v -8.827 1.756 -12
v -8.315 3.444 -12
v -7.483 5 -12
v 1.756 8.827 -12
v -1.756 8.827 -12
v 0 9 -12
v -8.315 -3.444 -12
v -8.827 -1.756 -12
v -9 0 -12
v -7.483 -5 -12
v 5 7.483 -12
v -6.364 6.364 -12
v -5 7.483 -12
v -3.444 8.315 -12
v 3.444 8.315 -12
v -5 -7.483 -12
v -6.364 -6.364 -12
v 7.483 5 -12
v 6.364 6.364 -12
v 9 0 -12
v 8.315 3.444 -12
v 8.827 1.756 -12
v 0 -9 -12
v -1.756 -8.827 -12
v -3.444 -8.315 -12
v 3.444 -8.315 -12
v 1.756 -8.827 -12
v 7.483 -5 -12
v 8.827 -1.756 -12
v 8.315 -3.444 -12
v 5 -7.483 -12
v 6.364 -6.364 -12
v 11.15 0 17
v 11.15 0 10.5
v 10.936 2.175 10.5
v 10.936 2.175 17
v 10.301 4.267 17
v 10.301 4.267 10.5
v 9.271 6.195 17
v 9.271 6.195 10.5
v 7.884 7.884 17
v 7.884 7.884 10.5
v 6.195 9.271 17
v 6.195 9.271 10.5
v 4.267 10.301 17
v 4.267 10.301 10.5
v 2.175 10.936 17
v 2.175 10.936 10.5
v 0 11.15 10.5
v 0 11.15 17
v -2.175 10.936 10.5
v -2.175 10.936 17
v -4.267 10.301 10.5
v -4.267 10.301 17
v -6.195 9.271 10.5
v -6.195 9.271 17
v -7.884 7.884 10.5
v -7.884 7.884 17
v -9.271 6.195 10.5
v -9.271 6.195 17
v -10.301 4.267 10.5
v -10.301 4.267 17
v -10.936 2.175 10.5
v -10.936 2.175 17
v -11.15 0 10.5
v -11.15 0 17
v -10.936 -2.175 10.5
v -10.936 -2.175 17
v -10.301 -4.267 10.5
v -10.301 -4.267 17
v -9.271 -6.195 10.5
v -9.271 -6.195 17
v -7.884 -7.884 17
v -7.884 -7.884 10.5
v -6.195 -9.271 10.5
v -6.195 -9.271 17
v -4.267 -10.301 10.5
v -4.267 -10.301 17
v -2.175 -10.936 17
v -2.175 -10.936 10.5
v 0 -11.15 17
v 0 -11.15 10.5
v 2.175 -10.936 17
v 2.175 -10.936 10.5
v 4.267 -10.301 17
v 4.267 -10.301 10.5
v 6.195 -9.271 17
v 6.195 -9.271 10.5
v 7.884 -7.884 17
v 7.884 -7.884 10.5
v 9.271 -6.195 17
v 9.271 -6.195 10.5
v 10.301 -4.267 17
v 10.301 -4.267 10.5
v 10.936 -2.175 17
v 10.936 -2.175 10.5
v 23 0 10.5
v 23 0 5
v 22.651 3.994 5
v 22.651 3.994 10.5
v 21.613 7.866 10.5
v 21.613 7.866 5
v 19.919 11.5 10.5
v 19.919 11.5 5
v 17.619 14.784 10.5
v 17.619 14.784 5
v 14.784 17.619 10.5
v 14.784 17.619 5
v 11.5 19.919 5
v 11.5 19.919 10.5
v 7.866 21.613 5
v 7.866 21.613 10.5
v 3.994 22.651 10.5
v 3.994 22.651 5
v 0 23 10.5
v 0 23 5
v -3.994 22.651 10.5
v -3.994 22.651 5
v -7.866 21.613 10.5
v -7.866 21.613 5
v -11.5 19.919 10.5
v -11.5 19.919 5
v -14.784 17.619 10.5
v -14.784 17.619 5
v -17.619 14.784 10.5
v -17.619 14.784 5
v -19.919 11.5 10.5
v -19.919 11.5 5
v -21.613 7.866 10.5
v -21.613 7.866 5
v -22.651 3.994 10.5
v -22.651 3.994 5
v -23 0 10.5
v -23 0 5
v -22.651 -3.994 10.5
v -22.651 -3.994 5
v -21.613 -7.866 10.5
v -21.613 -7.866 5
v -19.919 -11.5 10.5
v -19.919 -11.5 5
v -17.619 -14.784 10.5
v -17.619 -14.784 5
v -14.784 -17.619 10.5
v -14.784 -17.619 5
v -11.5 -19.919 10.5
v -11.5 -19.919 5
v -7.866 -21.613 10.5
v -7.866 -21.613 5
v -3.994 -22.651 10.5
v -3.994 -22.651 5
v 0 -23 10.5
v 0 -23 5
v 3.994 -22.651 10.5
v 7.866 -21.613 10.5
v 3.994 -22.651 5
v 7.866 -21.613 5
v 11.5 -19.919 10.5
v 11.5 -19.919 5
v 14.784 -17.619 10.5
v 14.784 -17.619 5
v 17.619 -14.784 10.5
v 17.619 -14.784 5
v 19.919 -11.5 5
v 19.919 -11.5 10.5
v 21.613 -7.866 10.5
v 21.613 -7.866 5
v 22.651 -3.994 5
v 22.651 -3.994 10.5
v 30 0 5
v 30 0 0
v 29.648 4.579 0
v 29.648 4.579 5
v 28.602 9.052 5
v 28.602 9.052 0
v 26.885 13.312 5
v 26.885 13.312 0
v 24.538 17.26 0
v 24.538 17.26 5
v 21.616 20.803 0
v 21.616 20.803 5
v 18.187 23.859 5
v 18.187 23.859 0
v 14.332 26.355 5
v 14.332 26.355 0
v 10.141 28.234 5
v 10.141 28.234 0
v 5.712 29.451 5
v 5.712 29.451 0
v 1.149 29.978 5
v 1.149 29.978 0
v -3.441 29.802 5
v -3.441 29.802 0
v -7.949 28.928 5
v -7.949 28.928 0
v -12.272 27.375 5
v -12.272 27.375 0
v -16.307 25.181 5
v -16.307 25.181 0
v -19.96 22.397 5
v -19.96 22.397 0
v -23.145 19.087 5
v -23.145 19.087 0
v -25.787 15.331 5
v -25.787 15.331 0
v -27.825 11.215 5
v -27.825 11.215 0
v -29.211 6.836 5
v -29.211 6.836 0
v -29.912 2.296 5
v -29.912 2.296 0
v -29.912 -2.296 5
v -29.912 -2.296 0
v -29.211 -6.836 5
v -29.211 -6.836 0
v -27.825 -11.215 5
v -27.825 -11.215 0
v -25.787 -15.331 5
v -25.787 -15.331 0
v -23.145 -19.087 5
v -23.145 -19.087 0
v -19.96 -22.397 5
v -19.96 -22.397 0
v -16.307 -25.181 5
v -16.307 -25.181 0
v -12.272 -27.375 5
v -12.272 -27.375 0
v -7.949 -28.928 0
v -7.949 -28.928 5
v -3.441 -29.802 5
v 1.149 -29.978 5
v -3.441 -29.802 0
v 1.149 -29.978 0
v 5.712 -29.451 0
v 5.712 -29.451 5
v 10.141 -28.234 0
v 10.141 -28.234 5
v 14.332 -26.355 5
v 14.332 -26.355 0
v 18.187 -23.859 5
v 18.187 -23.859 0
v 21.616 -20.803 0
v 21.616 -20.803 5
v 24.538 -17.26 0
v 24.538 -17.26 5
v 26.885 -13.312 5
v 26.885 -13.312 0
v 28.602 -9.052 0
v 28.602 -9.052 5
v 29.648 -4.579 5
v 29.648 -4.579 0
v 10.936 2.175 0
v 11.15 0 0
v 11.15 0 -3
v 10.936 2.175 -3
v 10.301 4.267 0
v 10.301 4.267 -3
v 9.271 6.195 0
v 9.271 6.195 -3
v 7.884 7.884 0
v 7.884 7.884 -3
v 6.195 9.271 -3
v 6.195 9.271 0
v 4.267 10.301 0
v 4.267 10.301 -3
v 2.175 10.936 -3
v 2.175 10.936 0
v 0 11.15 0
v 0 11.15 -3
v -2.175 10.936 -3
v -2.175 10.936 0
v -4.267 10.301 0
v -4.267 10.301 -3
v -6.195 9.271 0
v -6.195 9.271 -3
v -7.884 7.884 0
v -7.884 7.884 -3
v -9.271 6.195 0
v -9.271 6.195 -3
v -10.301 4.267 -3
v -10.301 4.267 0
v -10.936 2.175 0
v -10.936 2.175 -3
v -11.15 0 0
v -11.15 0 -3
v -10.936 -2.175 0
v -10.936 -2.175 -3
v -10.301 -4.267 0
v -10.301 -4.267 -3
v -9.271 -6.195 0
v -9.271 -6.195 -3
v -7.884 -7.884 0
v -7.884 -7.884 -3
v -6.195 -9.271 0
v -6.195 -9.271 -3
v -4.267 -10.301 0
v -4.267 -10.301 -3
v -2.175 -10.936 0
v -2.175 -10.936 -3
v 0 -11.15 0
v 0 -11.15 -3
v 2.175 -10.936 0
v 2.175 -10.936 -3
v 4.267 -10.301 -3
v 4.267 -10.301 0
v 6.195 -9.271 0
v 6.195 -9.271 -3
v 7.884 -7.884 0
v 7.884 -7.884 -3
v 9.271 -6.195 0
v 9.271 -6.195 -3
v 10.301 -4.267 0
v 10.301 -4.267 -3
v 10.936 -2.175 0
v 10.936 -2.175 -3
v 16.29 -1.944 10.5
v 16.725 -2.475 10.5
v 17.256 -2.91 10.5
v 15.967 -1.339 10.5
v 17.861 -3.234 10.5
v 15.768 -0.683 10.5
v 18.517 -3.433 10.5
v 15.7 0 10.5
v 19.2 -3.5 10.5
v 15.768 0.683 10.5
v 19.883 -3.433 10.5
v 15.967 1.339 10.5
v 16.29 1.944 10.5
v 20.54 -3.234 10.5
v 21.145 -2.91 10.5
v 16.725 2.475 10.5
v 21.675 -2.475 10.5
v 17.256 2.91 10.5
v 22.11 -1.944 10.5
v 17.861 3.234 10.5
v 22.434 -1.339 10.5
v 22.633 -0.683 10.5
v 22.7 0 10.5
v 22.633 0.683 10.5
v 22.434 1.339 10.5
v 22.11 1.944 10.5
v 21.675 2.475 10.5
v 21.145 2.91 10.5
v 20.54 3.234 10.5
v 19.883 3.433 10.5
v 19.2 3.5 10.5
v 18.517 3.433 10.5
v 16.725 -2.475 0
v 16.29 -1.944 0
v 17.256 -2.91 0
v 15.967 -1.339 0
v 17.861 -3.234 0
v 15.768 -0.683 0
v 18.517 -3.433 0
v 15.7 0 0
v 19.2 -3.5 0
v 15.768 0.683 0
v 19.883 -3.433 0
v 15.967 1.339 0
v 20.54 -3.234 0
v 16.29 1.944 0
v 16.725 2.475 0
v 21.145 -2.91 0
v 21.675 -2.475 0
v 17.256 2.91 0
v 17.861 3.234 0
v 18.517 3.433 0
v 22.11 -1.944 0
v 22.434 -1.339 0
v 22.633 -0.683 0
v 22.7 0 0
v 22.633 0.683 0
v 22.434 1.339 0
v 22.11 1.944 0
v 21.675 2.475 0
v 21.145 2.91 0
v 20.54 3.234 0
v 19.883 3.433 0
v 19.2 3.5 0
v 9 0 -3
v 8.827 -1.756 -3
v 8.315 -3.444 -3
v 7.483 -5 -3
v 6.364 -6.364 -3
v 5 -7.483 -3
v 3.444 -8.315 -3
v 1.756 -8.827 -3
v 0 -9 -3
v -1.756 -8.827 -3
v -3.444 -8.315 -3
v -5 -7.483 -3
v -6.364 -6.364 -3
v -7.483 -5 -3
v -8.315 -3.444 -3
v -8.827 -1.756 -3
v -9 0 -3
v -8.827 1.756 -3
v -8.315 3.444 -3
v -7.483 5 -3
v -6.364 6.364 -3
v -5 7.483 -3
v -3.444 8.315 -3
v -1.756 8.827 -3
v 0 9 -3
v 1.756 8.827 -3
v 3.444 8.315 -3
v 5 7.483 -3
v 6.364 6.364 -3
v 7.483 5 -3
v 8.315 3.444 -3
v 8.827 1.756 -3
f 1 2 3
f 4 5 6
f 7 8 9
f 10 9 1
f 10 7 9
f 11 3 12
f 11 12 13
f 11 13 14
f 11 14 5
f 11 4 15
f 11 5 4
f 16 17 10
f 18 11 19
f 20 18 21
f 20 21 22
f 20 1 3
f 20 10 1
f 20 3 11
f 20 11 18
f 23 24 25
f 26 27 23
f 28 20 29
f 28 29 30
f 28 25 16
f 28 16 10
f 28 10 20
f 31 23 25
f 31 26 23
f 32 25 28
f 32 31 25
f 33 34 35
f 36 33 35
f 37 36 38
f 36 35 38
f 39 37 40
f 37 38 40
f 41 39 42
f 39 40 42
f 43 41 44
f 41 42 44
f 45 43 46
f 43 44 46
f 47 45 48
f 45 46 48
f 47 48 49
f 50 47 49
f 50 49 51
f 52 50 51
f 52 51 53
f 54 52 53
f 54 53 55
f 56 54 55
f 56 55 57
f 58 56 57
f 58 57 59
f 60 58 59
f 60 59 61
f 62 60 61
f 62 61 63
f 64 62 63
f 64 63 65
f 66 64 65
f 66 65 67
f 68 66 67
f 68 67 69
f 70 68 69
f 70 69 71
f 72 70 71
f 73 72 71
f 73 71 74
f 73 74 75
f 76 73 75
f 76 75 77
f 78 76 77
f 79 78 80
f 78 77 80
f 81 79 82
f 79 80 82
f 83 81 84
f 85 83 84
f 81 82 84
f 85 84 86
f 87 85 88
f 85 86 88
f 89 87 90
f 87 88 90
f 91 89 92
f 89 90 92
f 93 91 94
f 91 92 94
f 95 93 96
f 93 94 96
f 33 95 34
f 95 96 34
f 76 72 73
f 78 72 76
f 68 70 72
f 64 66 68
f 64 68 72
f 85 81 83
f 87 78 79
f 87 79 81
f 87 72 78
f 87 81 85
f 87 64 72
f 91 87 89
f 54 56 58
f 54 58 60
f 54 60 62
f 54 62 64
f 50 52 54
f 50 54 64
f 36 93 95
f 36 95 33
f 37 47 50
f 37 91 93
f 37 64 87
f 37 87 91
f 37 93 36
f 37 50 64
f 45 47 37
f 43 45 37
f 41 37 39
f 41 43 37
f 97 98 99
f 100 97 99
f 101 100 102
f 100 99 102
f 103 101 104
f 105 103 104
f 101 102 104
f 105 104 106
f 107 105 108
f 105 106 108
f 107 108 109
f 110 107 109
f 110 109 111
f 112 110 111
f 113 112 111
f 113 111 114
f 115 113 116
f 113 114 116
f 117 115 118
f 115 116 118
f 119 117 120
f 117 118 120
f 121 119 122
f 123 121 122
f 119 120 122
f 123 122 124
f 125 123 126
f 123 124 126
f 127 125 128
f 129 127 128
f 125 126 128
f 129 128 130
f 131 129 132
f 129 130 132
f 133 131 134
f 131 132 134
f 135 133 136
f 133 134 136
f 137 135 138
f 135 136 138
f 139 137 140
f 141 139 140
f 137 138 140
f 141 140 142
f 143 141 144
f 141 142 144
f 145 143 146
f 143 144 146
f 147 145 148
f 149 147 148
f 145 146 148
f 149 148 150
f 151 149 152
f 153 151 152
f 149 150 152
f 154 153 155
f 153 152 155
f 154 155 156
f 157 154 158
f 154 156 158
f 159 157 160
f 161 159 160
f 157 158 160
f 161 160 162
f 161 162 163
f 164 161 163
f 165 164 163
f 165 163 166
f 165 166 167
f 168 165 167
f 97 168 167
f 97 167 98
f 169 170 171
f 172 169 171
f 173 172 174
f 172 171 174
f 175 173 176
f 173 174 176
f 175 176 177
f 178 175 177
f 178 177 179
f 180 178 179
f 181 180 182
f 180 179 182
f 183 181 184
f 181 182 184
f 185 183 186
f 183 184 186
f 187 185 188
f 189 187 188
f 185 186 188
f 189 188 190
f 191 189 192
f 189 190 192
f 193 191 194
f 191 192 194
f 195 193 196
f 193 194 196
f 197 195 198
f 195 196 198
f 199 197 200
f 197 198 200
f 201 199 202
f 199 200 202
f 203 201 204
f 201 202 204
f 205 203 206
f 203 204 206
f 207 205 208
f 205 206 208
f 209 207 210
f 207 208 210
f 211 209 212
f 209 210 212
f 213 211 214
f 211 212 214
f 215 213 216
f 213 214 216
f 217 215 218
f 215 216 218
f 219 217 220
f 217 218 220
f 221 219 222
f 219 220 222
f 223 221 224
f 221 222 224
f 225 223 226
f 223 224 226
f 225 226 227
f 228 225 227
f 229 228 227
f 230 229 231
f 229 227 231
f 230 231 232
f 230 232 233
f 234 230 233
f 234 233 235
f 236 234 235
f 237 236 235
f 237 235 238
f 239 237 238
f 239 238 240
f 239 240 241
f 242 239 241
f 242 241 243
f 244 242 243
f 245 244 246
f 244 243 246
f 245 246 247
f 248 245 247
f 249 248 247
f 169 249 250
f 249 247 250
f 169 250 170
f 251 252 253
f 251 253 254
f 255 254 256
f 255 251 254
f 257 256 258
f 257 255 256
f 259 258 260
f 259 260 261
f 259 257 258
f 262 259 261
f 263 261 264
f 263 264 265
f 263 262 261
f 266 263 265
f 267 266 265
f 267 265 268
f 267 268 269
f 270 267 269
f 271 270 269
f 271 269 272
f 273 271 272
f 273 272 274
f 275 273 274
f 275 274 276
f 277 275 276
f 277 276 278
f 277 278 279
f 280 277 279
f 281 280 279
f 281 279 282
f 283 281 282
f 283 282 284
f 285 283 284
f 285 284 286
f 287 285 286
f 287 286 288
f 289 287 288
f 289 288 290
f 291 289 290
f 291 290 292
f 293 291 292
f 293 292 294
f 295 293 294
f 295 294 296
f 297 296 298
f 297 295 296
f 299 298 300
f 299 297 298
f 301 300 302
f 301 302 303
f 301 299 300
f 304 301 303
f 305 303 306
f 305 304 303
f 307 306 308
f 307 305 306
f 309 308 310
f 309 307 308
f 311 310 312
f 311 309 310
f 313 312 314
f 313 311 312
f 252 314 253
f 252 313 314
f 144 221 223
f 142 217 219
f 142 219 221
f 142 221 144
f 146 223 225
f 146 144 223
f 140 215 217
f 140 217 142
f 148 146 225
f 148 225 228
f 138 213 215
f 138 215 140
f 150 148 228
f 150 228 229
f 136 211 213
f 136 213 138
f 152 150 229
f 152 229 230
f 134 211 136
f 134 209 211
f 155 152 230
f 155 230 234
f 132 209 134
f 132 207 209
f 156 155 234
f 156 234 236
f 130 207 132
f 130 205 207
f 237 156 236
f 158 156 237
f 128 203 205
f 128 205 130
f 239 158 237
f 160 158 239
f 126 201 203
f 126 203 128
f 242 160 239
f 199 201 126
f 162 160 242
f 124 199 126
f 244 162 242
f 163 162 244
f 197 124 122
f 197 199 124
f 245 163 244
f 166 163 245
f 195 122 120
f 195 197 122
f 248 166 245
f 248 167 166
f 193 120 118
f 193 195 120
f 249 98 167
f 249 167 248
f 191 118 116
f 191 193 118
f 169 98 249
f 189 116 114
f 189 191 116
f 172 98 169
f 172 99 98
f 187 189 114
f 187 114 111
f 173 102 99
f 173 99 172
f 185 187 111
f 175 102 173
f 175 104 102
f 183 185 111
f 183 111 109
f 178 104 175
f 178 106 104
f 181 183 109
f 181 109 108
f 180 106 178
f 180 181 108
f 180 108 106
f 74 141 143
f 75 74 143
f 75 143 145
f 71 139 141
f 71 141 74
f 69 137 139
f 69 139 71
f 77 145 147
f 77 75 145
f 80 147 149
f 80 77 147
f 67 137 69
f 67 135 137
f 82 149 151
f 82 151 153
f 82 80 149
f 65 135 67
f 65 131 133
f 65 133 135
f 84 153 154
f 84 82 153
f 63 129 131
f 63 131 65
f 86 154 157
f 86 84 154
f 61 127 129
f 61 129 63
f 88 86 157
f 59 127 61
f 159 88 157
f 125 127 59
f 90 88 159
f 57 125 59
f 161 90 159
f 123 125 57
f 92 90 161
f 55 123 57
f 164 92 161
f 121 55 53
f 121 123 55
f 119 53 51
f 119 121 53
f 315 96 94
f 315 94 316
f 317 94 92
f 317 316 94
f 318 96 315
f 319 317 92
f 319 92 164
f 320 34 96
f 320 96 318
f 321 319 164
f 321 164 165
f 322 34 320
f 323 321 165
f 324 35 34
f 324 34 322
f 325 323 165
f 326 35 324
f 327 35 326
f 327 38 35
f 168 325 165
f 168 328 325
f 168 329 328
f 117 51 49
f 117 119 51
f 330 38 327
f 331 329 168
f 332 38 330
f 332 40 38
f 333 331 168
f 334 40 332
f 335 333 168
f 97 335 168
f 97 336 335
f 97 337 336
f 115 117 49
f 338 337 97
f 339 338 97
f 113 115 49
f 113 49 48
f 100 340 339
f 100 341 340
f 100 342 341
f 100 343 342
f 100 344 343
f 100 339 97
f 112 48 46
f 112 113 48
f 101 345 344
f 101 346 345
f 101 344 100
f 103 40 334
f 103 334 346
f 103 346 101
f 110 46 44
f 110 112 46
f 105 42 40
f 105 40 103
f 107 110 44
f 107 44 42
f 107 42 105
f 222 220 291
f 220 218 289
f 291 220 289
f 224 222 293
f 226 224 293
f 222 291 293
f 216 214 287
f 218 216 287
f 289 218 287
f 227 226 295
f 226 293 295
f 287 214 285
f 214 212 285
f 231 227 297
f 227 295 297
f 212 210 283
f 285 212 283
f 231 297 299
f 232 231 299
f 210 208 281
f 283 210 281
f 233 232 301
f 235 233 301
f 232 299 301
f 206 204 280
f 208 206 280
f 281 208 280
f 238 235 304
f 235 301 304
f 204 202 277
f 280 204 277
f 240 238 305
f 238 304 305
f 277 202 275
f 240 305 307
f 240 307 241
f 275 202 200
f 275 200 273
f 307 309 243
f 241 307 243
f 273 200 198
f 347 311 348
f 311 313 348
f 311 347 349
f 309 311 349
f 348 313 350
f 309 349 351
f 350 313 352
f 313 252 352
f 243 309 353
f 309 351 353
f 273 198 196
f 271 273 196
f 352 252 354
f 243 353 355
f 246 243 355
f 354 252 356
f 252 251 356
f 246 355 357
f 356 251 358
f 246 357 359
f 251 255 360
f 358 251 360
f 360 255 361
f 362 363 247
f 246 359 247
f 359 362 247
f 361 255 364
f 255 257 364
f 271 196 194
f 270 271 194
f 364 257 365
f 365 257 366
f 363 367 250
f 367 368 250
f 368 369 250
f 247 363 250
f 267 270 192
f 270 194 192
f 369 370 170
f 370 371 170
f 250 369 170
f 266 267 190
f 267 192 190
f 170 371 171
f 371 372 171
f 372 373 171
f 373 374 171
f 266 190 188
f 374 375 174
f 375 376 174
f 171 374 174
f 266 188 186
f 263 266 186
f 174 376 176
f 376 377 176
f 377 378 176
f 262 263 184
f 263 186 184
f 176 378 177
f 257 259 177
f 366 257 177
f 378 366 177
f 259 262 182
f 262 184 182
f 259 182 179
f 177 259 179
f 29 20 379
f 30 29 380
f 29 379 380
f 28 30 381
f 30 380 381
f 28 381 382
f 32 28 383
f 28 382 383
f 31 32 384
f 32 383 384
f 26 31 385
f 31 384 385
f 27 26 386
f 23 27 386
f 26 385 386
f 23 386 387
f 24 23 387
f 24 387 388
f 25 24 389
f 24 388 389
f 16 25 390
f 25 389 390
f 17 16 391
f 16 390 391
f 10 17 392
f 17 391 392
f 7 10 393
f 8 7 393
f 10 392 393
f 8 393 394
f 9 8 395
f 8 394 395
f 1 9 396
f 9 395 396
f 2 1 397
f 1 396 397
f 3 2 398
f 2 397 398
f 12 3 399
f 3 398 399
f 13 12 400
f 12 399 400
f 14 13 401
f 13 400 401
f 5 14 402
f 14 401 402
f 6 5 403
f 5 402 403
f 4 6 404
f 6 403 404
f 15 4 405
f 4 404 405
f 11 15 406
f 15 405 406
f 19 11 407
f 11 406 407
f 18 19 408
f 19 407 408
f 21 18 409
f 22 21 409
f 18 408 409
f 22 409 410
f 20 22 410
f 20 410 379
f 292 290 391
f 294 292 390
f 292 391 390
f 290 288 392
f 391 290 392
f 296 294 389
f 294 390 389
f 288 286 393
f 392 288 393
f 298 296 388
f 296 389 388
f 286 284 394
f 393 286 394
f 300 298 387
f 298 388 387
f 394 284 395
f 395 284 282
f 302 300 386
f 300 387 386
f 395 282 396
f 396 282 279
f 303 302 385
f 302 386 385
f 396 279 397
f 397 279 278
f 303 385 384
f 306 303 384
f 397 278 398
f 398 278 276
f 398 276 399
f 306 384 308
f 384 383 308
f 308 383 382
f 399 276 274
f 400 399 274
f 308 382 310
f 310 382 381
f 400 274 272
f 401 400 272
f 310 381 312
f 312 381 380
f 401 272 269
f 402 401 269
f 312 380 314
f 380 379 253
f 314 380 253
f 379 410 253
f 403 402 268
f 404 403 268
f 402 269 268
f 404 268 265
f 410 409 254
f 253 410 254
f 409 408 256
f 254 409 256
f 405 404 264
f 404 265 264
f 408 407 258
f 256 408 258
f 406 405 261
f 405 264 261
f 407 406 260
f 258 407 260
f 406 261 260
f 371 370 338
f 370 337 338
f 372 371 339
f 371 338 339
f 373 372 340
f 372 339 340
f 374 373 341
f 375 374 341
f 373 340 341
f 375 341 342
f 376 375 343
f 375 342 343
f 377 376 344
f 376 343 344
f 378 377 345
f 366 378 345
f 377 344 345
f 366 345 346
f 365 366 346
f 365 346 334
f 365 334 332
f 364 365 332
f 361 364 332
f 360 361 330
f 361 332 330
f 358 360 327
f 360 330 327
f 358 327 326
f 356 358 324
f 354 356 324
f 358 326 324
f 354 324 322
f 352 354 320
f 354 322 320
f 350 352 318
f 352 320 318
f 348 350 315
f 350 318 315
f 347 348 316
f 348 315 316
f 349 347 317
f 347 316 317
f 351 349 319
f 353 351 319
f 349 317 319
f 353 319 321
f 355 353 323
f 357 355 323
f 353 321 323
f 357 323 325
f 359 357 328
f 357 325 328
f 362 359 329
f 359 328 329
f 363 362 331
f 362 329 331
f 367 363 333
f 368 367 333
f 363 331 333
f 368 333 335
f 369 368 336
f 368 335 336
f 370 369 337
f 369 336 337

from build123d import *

# Parameters (mm, degrees)
F0_R          = 30
F1_DEPTH      = 5
F2_R          = 11.15
F3_DEPTH      = 12
F3_DEPTH_BACK = 8
F4_R          = 9
F5_DEPTH      = 9
F6_R          = 23
F7_DEPTH      = 5.5
F8_R          = 3.5
F9_DEPTH      = 12.5


with BuildPart() as f1:
    # F0 (on Top) → F1 (new body)
    with BuildSketch(Plane.XY):
        Circle(F0_R)
    extrude(amount=F1_DEPTH)

    # F2 (on face) → F3 (join, two sides)
    with BuildSketch(Plane.XY.offset(5)) as f3_sk:
        Circle(F2_R)
    extrude(amount=F3_DEPTH)
    extrude(f3_sk.sketch, amount=-F3_DEPTH_BACK)

    # F4 (on face) → F5 (join)
    with BuildSketch(Plane(origin=(0, 0, -3), x_dir=(1, 0, 0), z_dir=(0, 0, -1))):
        Circle(F4_R)
    extrude(amount=F5_DEPTH)

    # F6 (on face) → F7 (join)
    with BuildSketch(Plane.XY.offset(5)):
        Circle(F6_R)
    extrude(amount=F7_DEPTH)

    # F8 (on face) → F9 (cut, symmetric)
    with BuildSketch(Plane.XY.offset(5)):
        with Locations((19.200256, 0)):
            Circle(F8_R)
    extrude(amount=F9_DEPTH, both=True, mode=Mode.SUBTRACT)


solid = f1.part
